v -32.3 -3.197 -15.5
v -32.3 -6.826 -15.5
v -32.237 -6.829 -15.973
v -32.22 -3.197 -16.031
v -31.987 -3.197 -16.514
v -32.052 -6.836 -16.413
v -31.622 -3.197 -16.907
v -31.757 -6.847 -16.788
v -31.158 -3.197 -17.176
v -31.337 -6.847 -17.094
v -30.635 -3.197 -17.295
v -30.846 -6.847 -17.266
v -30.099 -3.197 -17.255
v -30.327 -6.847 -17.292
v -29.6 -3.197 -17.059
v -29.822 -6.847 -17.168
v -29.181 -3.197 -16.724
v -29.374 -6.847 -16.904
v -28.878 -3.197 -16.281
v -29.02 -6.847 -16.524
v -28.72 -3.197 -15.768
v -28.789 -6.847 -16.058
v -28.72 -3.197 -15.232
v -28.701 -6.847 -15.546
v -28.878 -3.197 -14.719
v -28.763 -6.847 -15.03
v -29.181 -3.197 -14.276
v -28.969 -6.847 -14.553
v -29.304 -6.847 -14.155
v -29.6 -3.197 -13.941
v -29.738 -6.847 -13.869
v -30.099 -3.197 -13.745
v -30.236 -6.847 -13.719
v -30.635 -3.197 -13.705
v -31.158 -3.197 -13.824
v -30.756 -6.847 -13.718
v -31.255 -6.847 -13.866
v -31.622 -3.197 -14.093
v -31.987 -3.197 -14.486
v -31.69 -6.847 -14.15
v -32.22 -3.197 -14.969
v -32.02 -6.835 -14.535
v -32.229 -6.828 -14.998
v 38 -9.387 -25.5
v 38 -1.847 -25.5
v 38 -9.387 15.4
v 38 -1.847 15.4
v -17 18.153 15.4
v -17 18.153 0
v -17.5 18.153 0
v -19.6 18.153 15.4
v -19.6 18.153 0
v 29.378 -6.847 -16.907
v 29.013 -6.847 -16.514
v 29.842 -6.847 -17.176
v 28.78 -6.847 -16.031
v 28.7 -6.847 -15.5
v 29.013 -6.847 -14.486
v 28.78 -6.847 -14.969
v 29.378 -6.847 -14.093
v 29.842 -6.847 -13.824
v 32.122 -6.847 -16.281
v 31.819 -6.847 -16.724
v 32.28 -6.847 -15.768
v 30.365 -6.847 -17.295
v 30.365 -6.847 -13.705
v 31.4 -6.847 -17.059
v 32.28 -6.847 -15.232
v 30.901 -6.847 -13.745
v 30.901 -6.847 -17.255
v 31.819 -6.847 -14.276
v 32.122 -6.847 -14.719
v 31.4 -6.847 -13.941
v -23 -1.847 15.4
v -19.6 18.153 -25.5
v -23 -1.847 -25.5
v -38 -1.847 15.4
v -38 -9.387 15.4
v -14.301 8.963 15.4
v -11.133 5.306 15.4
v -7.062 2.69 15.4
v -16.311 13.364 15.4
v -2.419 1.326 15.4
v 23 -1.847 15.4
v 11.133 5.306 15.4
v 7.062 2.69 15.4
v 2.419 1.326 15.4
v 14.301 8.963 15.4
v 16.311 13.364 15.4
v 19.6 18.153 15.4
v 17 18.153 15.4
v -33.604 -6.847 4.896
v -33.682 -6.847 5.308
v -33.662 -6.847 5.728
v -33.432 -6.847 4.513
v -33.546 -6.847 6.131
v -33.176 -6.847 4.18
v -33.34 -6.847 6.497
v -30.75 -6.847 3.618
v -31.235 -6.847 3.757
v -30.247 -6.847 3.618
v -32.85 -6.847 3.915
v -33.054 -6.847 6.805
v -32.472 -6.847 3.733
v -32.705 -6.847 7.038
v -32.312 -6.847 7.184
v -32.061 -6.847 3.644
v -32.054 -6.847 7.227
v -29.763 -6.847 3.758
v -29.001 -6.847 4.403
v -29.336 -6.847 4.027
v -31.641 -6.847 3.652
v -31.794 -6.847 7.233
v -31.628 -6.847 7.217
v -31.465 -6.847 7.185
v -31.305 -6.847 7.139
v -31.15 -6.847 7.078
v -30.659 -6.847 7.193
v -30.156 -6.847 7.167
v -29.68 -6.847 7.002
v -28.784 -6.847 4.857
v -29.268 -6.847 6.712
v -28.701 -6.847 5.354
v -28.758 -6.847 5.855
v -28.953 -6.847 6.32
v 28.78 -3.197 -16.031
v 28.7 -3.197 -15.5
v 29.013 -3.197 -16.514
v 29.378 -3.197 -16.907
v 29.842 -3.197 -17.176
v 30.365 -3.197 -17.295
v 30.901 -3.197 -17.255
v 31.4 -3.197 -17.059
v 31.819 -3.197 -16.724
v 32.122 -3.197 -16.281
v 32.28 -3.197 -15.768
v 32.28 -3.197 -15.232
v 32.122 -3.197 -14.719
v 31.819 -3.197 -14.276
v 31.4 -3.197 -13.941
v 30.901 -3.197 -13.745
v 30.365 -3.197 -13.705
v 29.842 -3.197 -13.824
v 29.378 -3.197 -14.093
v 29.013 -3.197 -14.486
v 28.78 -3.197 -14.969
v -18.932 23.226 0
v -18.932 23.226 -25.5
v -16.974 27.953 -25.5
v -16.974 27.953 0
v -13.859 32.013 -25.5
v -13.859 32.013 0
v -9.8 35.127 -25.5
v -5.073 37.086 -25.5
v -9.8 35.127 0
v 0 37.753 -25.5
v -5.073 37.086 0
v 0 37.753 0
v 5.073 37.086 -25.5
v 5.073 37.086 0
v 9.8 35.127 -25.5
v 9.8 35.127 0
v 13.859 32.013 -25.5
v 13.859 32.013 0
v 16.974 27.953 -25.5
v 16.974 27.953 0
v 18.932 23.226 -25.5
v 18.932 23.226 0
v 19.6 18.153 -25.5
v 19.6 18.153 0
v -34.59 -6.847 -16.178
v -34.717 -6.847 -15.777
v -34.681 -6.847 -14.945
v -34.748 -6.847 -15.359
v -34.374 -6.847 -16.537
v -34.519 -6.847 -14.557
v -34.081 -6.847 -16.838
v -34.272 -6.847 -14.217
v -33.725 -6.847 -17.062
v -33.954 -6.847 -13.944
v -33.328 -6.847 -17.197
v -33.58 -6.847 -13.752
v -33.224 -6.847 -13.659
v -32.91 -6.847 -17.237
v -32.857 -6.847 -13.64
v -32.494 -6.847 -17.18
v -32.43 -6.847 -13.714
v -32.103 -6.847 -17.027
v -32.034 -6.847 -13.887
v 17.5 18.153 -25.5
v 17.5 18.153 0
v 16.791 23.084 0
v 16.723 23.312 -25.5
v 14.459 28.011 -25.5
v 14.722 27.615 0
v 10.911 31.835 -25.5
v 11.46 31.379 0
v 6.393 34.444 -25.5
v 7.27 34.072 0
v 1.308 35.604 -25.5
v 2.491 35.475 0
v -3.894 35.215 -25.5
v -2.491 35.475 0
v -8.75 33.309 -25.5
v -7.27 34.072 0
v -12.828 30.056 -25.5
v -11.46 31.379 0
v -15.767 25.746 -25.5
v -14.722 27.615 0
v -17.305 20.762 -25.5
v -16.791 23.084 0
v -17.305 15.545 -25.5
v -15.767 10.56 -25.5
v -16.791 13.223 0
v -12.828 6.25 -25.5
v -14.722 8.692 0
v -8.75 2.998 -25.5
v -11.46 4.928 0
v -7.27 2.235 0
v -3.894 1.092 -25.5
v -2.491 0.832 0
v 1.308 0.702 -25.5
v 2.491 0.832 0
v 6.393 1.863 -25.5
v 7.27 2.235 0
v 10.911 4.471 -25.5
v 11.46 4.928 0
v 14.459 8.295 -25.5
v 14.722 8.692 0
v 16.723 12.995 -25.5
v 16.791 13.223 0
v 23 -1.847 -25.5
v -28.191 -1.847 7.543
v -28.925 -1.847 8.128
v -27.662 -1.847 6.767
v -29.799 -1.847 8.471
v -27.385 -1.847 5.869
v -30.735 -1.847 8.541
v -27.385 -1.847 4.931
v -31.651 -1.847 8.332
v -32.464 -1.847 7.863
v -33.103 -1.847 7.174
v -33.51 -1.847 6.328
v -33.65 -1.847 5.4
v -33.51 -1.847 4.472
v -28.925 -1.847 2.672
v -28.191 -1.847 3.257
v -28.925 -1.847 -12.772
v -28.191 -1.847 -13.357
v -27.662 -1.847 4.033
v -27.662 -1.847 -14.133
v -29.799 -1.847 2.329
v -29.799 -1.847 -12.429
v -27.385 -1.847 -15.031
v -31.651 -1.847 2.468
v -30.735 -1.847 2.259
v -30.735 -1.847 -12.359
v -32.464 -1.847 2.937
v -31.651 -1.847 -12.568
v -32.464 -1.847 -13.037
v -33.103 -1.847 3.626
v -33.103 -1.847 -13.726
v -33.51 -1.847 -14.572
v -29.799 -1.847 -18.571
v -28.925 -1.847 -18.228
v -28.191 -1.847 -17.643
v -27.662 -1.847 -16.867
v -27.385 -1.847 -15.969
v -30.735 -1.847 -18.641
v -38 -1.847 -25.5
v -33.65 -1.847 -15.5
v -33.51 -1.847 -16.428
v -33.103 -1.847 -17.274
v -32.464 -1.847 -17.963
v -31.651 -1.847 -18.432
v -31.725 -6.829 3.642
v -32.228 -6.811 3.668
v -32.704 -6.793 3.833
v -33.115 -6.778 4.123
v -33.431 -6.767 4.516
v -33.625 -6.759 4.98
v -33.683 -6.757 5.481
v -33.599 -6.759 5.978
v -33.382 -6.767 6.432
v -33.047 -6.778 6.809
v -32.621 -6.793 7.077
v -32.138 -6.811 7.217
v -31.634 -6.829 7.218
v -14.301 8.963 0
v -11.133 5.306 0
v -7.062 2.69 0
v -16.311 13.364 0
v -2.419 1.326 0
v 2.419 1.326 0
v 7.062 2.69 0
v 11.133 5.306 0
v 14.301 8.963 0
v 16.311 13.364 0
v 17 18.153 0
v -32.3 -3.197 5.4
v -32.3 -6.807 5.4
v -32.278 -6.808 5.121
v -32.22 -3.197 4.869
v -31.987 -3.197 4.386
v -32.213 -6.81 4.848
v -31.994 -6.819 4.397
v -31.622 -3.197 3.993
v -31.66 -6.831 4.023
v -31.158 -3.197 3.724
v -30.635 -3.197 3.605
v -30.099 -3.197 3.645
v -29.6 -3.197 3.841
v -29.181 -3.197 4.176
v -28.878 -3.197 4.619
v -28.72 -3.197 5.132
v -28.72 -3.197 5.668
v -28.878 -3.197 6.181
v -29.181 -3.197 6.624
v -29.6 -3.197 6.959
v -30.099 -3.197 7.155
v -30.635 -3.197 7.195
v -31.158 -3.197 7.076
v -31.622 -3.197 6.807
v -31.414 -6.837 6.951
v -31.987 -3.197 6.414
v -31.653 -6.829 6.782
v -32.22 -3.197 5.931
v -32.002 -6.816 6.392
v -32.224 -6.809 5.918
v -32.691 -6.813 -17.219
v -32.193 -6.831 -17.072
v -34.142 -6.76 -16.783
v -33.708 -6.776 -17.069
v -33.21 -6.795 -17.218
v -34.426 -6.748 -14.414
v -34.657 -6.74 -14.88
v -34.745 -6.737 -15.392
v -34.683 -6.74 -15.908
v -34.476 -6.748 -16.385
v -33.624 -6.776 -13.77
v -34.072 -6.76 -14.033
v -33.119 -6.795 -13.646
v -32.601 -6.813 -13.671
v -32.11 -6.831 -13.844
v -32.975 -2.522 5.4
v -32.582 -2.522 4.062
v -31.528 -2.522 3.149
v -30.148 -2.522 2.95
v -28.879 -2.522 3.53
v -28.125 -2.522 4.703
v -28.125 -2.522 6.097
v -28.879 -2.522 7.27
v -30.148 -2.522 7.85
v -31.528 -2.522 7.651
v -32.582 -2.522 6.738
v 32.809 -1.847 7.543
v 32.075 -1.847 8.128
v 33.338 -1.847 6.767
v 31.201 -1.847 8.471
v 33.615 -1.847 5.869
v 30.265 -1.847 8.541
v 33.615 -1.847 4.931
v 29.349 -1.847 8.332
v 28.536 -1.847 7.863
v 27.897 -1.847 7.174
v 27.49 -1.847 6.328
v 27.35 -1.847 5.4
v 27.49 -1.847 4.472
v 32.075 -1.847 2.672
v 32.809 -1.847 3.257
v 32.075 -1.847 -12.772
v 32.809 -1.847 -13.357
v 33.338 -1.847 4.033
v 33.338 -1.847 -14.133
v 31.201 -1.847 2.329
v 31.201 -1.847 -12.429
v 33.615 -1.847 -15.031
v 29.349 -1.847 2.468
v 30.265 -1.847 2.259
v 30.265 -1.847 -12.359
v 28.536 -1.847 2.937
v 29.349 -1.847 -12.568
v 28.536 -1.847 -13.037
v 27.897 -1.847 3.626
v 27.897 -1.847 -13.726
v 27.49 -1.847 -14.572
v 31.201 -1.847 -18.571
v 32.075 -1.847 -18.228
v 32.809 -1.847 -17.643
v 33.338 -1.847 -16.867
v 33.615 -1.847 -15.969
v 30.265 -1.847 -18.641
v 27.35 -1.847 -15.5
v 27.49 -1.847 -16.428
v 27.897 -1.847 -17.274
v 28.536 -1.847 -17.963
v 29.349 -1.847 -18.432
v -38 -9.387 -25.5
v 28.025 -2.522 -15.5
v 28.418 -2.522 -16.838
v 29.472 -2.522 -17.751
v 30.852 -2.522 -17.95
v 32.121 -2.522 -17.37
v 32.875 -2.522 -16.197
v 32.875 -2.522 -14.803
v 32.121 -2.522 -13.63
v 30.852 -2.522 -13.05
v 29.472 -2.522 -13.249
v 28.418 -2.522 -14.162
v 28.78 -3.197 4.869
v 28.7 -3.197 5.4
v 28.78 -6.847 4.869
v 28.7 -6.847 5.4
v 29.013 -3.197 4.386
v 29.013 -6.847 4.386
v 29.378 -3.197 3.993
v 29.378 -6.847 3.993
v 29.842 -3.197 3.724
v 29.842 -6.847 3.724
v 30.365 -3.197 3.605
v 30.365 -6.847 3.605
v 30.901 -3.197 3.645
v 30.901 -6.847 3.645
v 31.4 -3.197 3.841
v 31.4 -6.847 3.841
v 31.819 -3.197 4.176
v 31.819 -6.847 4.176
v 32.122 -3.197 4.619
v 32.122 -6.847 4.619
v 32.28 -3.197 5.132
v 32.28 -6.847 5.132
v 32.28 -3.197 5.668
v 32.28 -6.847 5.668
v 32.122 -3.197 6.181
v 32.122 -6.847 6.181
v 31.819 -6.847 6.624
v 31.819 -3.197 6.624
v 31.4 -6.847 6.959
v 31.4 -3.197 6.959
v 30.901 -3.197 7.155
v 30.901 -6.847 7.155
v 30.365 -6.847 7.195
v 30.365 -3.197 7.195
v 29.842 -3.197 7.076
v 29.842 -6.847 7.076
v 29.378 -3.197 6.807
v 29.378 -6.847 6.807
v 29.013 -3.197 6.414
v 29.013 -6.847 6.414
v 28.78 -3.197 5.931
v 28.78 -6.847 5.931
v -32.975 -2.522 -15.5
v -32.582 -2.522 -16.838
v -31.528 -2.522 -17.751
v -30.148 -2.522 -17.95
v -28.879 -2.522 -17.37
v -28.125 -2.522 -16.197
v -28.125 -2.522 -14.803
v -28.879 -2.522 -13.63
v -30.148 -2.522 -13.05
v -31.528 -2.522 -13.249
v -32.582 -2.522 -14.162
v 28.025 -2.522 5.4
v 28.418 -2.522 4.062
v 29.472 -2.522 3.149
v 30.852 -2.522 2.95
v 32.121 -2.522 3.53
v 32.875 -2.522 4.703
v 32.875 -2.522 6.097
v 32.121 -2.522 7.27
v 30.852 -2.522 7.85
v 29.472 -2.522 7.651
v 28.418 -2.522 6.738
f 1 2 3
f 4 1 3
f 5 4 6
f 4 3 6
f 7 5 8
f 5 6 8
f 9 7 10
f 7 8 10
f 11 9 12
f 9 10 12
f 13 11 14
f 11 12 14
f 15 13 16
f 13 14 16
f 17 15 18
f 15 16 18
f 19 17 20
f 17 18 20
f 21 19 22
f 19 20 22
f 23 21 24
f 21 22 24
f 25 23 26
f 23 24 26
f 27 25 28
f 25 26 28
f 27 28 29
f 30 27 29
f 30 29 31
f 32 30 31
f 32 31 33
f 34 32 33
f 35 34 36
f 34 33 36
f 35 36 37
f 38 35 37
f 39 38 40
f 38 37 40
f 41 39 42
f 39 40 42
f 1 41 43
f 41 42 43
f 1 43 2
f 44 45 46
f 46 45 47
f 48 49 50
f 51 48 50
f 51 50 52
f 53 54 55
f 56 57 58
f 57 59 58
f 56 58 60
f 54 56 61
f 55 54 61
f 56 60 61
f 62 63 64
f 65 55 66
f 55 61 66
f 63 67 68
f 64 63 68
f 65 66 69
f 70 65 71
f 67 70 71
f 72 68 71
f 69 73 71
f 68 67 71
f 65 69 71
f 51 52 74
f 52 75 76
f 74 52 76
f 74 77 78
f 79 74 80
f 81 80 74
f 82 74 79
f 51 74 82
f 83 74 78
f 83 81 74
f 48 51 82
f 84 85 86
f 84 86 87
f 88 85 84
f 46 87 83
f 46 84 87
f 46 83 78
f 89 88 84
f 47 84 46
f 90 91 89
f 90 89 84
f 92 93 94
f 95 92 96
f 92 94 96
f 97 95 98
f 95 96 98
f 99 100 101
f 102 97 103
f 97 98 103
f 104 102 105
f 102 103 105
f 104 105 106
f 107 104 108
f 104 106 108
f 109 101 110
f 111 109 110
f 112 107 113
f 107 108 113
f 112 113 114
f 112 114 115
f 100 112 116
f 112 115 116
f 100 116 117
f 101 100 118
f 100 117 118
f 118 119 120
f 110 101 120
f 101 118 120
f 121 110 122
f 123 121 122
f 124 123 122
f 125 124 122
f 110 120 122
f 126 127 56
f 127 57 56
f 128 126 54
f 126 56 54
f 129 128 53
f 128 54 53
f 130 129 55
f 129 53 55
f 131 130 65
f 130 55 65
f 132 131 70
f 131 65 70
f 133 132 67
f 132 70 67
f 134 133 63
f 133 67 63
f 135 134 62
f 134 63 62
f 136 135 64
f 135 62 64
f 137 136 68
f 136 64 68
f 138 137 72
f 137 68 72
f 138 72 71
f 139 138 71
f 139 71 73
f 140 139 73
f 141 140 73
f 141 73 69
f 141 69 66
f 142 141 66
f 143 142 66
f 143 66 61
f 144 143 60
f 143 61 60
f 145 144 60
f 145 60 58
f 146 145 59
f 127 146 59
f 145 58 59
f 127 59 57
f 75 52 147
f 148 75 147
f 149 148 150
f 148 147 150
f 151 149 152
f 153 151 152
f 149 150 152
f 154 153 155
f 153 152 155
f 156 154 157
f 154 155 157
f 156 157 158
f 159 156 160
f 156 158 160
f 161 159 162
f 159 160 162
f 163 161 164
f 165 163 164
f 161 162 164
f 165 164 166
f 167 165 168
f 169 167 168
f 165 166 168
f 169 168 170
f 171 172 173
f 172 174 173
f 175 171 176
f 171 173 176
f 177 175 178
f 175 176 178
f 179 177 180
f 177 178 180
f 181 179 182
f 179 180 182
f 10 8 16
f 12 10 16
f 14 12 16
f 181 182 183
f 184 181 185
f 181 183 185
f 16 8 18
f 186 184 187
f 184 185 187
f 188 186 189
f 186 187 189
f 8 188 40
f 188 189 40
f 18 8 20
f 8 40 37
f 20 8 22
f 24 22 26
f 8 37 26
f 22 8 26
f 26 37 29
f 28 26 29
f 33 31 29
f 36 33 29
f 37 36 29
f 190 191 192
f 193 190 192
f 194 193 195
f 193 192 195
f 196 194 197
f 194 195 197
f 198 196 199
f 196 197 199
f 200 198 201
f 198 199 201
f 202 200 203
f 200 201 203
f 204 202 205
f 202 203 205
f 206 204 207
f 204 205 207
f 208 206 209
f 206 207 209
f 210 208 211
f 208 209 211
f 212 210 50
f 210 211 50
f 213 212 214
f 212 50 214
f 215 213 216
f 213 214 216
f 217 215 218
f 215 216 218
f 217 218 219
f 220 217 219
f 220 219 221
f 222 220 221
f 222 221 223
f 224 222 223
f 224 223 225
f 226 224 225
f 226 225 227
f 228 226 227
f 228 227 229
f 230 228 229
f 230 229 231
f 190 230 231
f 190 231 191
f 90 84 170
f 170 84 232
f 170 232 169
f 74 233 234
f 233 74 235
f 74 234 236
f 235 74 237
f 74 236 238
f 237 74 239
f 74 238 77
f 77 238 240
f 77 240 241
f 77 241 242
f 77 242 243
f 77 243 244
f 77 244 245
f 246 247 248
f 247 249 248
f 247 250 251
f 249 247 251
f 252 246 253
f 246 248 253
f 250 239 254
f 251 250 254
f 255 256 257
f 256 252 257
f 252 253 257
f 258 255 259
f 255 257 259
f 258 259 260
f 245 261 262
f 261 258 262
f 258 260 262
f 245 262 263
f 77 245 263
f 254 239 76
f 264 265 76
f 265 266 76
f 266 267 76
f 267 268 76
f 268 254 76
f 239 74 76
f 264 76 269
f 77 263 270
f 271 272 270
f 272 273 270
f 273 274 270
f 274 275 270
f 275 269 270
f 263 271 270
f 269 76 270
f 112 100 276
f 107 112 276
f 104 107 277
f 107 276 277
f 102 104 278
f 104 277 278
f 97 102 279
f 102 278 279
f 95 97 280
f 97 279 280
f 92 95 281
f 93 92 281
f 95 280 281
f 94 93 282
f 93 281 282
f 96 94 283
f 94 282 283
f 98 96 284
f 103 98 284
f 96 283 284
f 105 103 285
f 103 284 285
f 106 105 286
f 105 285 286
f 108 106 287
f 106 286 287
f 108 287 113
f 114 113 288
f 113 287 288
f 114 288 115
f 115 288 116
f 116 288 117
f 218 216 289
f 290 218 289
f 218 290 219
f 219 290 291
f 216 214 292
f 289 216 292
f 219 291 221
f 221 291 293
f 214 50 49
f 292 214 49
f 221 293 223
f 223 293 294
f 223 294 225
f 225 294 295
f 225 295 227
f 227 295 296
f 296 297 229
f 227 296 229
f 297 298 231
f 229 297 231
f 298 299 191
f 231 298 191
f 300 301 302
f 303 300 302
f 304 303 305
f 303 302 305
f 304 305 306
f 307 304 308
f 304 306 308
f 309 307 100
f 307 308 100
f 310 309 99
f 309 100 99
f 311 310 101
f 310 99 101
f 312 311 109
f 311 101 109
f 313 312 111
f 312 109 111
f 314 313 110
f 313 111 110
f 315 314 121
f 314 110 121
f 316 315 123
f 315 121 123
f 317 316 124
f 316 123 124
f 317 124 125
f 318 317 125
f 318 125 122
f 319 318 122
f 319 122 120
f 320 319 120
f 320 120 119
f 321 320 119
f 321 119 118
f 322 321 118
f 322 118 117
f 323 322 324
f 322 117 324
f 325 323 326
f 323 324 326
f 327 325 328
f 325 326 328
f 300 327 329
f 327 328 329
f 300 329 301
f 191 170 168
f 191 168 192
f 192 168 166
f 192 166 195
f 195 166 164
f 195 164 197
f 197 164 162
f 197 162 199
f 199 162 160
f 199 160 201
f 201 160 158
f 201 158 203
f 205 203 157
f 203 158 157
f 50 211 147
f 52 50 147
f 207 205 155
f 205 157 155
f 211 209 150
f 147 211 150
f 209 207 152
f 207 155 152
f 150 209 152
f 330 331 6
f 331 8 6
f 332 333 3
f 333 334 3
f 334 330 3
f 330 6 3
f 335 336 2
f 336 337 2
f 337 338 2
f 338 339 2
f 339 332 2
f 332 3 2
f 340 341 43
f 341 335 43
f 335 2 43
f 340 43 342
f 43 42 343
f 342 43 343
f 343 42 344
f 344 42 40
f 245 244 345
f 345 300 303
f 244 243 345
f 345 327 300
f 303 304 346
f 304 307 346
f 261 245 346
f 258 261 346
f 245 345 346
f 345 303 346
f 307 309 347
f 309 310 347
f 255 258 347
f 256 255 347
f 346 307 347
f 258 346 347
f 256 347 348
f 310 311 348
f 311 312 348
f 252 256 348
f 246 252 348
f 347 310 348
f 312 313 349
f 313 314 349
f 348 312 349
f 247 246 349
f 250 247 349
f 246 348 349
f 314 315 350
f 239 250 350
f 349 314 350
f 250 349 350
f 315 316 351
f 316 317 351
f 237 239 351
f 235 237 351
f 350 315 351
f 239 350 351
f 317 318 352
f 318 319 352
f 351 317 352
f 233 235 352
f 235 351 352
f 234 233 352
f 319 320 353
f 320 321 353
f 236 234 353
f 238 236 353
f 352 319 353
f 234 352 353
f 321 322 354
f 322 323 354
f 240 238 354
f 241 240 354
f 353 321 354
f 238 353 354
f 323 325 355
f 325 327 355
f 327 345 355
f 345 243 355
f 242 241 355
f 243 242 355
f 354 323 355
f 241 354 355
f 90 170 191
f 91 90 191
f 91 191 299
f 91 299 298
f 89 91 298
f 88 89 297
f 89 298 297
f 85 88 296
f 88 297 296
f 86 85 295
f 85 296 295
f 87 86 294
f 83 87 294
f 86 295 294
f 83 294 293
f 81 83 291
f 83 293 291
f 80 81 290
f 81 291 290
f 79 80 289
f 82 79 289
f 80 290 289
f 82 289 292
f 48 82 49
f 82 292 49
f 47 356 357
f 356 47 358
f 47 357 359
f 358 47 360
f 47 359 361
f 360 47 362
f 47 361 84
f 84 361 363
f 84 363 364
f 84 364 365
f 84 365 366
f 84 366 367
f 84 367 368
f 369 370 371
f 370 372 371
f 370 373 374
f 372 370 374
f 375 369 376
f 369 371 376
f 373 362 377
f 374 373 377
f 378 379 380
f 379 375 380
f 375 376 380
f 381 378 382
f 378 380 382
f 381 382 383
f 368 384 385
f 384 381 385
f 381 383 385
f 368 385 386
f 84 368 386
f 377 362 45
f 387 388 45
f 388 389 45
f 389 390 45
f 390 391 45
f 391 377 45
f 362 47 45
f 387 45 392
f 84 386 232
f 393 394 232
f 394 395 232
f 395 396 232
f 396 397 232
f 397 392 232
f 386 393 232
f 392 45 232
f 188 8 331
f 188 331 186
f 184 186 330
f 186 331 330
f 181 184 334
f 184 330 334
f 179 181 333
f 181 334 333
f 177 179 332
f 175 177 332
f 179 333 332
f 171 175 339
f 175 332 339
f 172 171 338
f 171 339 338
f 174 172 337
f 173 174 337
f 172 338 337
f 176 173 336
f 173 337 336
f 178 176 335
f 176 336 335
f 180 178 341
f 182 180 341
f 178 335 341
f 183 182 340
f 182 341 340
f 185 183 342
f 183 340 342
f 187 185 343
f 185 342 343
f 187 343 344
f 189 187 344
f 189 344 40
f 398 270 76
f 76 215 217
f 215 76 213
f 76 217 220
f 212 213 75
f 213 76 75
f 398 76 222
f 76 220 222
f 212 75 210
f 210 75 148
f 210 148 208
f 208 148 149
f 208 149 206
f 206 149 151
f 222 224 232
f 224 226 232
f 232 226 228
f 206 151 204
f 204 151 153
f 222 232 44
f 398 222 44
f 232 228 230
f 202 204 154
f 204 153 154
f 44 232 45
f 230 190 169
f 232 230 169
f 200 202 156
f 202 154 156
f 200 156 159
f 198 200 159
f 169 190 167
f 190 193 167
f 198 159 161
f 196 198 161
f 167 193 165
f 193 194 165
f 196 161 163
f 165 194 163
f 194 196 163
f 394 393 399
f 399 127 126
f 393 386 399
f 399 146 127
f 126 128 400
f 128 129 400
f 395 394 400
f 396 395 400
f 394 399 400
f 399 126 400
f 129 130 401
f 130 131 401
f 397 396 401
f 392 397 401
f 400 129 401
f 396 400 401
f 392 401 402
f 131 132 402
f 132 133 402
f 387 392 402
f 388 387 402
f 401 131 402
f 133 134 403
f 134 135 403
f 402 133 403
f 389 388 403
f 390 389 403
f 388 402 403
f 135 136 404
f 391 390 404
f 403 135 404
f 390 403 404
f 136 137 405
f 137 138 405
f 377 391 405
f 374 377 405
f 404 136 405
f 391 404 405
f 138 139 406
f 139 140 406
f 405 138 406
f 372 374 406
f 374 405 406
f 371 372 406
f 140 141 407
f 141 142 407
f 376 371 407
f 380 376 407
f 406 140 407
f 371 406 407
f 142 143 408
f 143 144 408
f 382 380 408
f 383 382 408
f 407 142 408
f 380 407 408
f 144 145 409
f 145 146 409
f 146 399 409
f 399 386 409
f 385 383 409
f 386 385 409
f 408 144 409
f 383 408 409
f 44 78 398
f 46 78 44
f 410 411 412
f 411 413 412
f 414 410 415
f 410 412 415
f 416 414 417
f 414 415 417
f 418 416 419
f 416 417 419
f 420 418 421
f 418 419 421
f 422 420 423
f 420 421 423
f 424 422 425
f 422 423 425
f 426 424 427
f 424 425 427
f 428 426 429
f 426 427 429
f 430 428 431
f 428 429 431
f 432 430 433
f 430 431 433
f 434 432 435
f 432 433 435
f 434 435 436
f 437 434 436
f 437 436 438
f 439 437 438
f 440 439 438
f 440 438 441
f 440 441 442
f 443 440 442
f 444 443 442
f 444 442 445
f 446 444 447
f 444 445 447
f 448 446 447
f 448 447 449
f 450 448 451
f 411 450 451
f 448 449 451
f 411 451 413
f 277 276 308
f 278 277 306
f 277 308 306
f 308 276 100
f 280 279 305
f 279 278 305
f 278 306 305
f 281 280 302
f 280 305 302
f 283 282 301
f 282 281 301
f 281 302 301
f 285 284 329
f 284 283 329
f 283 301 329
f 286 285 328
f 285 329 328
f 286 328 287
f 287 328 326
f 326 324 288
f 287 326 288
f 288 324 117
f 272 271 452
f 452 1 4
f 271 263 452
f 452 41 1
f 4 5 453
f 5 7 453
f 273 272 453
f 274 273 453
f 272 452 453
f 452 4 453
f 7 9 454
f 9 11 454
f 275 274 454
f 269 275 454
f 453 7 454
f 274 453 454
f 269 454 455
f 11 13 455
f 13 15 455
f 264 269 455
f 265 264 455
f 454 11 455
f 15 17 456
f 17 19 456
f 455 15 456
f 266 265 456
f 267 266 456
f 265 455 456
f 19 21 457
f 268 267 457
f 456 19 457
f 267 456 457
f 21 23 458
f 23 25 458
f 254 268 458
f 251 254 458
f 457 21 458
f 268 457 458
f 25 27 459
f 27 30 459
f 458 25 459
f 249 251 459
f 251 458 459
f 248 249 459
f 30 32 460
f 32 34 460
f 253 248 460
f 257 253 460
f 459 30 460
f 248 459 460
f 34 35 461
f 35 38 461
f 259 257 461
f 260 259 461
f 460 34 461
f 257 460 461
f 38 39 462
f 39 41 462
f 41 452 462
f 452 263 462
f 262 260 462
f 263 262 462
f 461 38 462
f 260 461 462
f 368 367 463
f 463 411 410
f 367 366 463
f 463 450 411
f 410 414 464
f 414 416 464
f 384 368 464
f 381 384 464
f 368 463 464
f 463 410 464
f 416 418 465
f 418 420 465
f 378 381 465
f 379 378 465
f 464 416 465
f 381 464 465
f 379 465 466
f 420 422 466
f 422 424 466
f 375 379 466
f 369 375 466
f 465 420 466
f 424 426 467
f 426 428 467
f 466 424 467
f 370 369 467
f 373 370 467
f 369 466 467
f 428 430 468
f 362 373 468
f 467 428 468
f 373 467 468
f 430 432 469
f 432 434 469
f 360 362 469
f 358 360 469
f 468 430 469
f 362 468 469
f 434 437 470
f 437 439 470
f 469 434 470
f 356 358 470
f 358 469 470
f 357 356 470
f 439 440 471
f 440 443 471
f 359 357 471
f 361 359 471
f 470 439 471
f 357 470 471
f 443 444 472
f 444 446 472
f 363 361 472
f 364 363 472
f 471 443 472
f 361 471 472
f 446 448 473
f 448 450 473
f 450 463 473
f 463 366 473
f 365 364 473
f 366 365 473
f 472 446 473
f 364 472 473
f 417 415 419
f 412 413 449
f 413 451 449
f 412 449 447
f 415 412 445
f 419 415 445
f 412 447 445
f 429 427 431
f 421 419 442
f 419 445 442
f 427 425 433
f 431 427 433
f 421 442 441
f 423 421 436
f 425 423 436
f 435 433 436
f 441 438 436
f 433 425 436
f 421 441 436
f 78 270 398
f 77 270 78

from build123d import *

# Parameters (mm, degrees)
SKETCH1_R                                       = 17.5
BOSS_EXTRUDE9_DEPTH                             = 25.5
BOSS_EXTRUDE10_DEPTH                            = 15.4
BOSS_EXTRUDE10_DEPTH_BACK                       = 25.5
CSK_FOR_M3_FLAT_HEAD_MACHINE_SCREW1_D           = 3.6
CSK_FOR_M3_FLAT_HEAD_MACHINE_SCREW1_CSINK_D     = 6.3
CSK_FOR_M3_FLAT_HEAD_MACHINE_SCREW1_CSINK_ANGLE = 90
CSK_FOR_M3_FLAT_HEAD_MACHINE_SCREW2_D           = 3.6
CSK_FOR_M3_FLAT_HEAD_MACHINE_SCREW2_CSINK_D     = 6.3
CSK_FOR_M3_FLAT_HEAD_MACHINE_SCREW2_CSINK_ANGLE = 90
BOSS_EXTRUDE11_DEPTH                            = 15.4
CUT_EXTRUDE3_REACH                              = 549.129
SKETCH17_R                                      = 1.8
SKETCH18_W                                      = 76
SKETCH18_H                                      = 40.9
BOSS_EXTRUDE12_DEPTH                            = 2.54


with BuildPart() as part:
    # Sketch1 → Boss-Extrude9 (new body)
    with BuildSketch(Plane.XY):
        with BuildLine():
            ThreePointArc((-19.6, 18.153395679), (0, 37.753395679), (19.6, 18.153395679))
            ThreePointArc((19.6, 18.153395679), (0, -1.446604321), (-19.6, 18.153395679))
        make_face()
        with Locations((0, 18.153395679)):
            Circle(SKETCH1_R, mode=Mode.SUBTRACT)
    extrude(amount=-BOSS_EXTRUDE9_DEPTH)

    # Sketch1<15> → Boss-Extrude10 (add, two sides: drawn at the far end of the back side and taken through both)
    with BuildSketch(Plane.XY.offset(-BOSS_EXTRUDE10_DEPTH_BACK)):
        with BuildLine():
            Line((-23, -1.846604321), (-38, -1.846604321))
            Line((-38, -1.846604321), (-38, -6.846604321))
            Line((-38, -6.846604321), (38, -6.846604321))
            Line((38, -6.846604321), (38, -1.846604321))
            Line((38, -1.846604321), (23, -1.846604321))
            Line((23, -1.846604321), (19.6, 18.153395679))
            ThreePointArc((19.6, 18.153395679), (0, -1.446604321), (-19.6, 18.153395679))
            Line((-19.6, 18.153395679), (-23, -1.846604321))
        make_face()
    extrude(amount=BOSS_EXTRUDE10_DEPTH + BOSS_EXTRUDE10_DEPTH_BACK)

    # CSK for M3 Flat Head Machine Screw1 (through all)
    with Locations(Plane(origin=(0, -1.846604321, 0), x_dir=(1, 0, 0), z_dir=(0, 1, 0))):
        with Locations((-30.5, 15.5), (-30.5, -5.4)):
            CounterSinkHole(CSK_FOR_M3_FLAT_HEAD_MACHINE_SCREW1_D / 2, CSK_FOR_M3_FLAT_HEAD_MACHINE_SCREW1_CSINK_D / 2, counter_sink_angle=CSK_FOR_M3_FLAT_HEAD_MACHINE_SCREW1_CSINK_ANGLE)

    # CSK for M3 Flat Head Machine Screw2 (through all)
    with Locations(Plane(origin=(0, -1.846604321, 0), x_dir=(1, 0, 0), z_dir=(0, 1, 0))):
        with Locations((30.5, -5.4), (30.5, 15.5)):
            CounterSinkHole(CSK_FOR_M3_FLAT_HEAD_MACHINE_SCREW2_D / 2, CSK_FOR_M3_FLAT_HEAD_MACHINE_SCREW2_CSINK_D / 2, counter_sink_angle=CSK_FOR_M3_FLAT_HEAD_MACHINE_SCREW2_CSINK_ANGLE)

    # Sketch1<19> → Boss-Extrude11 (add)
    with BuildSketch(Plane.XY):
        with BuildLine():
            ThreePointArc((-19.6, 18.153395679), (0, -1.446604321), (19.6, 18.153395679))
            Line((19.6, 18.153395679), (17, 18.153395679))
            ThreePointArc((17, 18.153395679), (0, 1.153395679), (-17, 18.153395679))
            Line((-17, 18.153395679), (-19.6, 18.153395679))
        make_face()
    extrude(amount=BOSS_EXTRUDE11_DEPTH)

    # Sketch17 → Cut-Extrude3 (cut, up to next)
    with BuildSketch(Plane(origin=(-499.24894984, 9.974554812, -84.308871479), x_dir=(0.050830850863694654, -0.0009181581696580717, 0.9987068546806156), z_dir=(0.0360908865319125, 0.9993480899541042, -0.0009181581696581681)), mode=Mode.PRIVATE) as cut_extrude3_sk1:
        with Locations((92.5, 462.5)):
            Circle(SKETCH17_R)
    cut_extrude3_tool1 = extrude(cut_extrude3_sk1.sketch, amount=-CUT_EXTRUDE3_REACH, mode=Mode.PRIVATE) & part.part
    # Sketch17 → Cut-Extrude3 (cut, up to next)
    with BuildSketch(Plane(origin=(-499.24894984, 9.974554812, -84.308871479), x_dir=(0.050830850863694654, -0.0009181581696580717, 0.9987068546806156), z_dir=(0.0360908865319125, 0.9993480899541042, -0.0009181581696581681)), mode=Mode.PRIVATE) as cut_extrude3_sk2:
        with Locations((113.4, 462.5)):
            Circle(SKETCH17_R)
    cut_extrude3_tool2 = extrude(cut_extrude3_sk2.sketch, amount=-CUT_EXTRUDE3_REACH, mode=Mode.PRIVATE) & part.part
    add(cut_extrude3_tool1.solids().sort_by_distance((-32.946684, -6.80241, -15.437756))[0], mode=Mode.SUBTRACT)
    add(cut_extrude3_tool2.solids().sort_by_distance((-31.884319, -6.821599, 5.435217))[0], mode=Mode.SUBTRACT)

    # Sketch18 → Boss-Extrude12 (add)
    with BuildSketch(Plane.XZ.offset(6.846604321)):
        with Locations((0, -5.05)):
            Rectangle(SKETCH18_W, SKETCH18_H)
    extrude(amount=BOSS_EXTRUDE12_DEPTH)


solid = part.part
